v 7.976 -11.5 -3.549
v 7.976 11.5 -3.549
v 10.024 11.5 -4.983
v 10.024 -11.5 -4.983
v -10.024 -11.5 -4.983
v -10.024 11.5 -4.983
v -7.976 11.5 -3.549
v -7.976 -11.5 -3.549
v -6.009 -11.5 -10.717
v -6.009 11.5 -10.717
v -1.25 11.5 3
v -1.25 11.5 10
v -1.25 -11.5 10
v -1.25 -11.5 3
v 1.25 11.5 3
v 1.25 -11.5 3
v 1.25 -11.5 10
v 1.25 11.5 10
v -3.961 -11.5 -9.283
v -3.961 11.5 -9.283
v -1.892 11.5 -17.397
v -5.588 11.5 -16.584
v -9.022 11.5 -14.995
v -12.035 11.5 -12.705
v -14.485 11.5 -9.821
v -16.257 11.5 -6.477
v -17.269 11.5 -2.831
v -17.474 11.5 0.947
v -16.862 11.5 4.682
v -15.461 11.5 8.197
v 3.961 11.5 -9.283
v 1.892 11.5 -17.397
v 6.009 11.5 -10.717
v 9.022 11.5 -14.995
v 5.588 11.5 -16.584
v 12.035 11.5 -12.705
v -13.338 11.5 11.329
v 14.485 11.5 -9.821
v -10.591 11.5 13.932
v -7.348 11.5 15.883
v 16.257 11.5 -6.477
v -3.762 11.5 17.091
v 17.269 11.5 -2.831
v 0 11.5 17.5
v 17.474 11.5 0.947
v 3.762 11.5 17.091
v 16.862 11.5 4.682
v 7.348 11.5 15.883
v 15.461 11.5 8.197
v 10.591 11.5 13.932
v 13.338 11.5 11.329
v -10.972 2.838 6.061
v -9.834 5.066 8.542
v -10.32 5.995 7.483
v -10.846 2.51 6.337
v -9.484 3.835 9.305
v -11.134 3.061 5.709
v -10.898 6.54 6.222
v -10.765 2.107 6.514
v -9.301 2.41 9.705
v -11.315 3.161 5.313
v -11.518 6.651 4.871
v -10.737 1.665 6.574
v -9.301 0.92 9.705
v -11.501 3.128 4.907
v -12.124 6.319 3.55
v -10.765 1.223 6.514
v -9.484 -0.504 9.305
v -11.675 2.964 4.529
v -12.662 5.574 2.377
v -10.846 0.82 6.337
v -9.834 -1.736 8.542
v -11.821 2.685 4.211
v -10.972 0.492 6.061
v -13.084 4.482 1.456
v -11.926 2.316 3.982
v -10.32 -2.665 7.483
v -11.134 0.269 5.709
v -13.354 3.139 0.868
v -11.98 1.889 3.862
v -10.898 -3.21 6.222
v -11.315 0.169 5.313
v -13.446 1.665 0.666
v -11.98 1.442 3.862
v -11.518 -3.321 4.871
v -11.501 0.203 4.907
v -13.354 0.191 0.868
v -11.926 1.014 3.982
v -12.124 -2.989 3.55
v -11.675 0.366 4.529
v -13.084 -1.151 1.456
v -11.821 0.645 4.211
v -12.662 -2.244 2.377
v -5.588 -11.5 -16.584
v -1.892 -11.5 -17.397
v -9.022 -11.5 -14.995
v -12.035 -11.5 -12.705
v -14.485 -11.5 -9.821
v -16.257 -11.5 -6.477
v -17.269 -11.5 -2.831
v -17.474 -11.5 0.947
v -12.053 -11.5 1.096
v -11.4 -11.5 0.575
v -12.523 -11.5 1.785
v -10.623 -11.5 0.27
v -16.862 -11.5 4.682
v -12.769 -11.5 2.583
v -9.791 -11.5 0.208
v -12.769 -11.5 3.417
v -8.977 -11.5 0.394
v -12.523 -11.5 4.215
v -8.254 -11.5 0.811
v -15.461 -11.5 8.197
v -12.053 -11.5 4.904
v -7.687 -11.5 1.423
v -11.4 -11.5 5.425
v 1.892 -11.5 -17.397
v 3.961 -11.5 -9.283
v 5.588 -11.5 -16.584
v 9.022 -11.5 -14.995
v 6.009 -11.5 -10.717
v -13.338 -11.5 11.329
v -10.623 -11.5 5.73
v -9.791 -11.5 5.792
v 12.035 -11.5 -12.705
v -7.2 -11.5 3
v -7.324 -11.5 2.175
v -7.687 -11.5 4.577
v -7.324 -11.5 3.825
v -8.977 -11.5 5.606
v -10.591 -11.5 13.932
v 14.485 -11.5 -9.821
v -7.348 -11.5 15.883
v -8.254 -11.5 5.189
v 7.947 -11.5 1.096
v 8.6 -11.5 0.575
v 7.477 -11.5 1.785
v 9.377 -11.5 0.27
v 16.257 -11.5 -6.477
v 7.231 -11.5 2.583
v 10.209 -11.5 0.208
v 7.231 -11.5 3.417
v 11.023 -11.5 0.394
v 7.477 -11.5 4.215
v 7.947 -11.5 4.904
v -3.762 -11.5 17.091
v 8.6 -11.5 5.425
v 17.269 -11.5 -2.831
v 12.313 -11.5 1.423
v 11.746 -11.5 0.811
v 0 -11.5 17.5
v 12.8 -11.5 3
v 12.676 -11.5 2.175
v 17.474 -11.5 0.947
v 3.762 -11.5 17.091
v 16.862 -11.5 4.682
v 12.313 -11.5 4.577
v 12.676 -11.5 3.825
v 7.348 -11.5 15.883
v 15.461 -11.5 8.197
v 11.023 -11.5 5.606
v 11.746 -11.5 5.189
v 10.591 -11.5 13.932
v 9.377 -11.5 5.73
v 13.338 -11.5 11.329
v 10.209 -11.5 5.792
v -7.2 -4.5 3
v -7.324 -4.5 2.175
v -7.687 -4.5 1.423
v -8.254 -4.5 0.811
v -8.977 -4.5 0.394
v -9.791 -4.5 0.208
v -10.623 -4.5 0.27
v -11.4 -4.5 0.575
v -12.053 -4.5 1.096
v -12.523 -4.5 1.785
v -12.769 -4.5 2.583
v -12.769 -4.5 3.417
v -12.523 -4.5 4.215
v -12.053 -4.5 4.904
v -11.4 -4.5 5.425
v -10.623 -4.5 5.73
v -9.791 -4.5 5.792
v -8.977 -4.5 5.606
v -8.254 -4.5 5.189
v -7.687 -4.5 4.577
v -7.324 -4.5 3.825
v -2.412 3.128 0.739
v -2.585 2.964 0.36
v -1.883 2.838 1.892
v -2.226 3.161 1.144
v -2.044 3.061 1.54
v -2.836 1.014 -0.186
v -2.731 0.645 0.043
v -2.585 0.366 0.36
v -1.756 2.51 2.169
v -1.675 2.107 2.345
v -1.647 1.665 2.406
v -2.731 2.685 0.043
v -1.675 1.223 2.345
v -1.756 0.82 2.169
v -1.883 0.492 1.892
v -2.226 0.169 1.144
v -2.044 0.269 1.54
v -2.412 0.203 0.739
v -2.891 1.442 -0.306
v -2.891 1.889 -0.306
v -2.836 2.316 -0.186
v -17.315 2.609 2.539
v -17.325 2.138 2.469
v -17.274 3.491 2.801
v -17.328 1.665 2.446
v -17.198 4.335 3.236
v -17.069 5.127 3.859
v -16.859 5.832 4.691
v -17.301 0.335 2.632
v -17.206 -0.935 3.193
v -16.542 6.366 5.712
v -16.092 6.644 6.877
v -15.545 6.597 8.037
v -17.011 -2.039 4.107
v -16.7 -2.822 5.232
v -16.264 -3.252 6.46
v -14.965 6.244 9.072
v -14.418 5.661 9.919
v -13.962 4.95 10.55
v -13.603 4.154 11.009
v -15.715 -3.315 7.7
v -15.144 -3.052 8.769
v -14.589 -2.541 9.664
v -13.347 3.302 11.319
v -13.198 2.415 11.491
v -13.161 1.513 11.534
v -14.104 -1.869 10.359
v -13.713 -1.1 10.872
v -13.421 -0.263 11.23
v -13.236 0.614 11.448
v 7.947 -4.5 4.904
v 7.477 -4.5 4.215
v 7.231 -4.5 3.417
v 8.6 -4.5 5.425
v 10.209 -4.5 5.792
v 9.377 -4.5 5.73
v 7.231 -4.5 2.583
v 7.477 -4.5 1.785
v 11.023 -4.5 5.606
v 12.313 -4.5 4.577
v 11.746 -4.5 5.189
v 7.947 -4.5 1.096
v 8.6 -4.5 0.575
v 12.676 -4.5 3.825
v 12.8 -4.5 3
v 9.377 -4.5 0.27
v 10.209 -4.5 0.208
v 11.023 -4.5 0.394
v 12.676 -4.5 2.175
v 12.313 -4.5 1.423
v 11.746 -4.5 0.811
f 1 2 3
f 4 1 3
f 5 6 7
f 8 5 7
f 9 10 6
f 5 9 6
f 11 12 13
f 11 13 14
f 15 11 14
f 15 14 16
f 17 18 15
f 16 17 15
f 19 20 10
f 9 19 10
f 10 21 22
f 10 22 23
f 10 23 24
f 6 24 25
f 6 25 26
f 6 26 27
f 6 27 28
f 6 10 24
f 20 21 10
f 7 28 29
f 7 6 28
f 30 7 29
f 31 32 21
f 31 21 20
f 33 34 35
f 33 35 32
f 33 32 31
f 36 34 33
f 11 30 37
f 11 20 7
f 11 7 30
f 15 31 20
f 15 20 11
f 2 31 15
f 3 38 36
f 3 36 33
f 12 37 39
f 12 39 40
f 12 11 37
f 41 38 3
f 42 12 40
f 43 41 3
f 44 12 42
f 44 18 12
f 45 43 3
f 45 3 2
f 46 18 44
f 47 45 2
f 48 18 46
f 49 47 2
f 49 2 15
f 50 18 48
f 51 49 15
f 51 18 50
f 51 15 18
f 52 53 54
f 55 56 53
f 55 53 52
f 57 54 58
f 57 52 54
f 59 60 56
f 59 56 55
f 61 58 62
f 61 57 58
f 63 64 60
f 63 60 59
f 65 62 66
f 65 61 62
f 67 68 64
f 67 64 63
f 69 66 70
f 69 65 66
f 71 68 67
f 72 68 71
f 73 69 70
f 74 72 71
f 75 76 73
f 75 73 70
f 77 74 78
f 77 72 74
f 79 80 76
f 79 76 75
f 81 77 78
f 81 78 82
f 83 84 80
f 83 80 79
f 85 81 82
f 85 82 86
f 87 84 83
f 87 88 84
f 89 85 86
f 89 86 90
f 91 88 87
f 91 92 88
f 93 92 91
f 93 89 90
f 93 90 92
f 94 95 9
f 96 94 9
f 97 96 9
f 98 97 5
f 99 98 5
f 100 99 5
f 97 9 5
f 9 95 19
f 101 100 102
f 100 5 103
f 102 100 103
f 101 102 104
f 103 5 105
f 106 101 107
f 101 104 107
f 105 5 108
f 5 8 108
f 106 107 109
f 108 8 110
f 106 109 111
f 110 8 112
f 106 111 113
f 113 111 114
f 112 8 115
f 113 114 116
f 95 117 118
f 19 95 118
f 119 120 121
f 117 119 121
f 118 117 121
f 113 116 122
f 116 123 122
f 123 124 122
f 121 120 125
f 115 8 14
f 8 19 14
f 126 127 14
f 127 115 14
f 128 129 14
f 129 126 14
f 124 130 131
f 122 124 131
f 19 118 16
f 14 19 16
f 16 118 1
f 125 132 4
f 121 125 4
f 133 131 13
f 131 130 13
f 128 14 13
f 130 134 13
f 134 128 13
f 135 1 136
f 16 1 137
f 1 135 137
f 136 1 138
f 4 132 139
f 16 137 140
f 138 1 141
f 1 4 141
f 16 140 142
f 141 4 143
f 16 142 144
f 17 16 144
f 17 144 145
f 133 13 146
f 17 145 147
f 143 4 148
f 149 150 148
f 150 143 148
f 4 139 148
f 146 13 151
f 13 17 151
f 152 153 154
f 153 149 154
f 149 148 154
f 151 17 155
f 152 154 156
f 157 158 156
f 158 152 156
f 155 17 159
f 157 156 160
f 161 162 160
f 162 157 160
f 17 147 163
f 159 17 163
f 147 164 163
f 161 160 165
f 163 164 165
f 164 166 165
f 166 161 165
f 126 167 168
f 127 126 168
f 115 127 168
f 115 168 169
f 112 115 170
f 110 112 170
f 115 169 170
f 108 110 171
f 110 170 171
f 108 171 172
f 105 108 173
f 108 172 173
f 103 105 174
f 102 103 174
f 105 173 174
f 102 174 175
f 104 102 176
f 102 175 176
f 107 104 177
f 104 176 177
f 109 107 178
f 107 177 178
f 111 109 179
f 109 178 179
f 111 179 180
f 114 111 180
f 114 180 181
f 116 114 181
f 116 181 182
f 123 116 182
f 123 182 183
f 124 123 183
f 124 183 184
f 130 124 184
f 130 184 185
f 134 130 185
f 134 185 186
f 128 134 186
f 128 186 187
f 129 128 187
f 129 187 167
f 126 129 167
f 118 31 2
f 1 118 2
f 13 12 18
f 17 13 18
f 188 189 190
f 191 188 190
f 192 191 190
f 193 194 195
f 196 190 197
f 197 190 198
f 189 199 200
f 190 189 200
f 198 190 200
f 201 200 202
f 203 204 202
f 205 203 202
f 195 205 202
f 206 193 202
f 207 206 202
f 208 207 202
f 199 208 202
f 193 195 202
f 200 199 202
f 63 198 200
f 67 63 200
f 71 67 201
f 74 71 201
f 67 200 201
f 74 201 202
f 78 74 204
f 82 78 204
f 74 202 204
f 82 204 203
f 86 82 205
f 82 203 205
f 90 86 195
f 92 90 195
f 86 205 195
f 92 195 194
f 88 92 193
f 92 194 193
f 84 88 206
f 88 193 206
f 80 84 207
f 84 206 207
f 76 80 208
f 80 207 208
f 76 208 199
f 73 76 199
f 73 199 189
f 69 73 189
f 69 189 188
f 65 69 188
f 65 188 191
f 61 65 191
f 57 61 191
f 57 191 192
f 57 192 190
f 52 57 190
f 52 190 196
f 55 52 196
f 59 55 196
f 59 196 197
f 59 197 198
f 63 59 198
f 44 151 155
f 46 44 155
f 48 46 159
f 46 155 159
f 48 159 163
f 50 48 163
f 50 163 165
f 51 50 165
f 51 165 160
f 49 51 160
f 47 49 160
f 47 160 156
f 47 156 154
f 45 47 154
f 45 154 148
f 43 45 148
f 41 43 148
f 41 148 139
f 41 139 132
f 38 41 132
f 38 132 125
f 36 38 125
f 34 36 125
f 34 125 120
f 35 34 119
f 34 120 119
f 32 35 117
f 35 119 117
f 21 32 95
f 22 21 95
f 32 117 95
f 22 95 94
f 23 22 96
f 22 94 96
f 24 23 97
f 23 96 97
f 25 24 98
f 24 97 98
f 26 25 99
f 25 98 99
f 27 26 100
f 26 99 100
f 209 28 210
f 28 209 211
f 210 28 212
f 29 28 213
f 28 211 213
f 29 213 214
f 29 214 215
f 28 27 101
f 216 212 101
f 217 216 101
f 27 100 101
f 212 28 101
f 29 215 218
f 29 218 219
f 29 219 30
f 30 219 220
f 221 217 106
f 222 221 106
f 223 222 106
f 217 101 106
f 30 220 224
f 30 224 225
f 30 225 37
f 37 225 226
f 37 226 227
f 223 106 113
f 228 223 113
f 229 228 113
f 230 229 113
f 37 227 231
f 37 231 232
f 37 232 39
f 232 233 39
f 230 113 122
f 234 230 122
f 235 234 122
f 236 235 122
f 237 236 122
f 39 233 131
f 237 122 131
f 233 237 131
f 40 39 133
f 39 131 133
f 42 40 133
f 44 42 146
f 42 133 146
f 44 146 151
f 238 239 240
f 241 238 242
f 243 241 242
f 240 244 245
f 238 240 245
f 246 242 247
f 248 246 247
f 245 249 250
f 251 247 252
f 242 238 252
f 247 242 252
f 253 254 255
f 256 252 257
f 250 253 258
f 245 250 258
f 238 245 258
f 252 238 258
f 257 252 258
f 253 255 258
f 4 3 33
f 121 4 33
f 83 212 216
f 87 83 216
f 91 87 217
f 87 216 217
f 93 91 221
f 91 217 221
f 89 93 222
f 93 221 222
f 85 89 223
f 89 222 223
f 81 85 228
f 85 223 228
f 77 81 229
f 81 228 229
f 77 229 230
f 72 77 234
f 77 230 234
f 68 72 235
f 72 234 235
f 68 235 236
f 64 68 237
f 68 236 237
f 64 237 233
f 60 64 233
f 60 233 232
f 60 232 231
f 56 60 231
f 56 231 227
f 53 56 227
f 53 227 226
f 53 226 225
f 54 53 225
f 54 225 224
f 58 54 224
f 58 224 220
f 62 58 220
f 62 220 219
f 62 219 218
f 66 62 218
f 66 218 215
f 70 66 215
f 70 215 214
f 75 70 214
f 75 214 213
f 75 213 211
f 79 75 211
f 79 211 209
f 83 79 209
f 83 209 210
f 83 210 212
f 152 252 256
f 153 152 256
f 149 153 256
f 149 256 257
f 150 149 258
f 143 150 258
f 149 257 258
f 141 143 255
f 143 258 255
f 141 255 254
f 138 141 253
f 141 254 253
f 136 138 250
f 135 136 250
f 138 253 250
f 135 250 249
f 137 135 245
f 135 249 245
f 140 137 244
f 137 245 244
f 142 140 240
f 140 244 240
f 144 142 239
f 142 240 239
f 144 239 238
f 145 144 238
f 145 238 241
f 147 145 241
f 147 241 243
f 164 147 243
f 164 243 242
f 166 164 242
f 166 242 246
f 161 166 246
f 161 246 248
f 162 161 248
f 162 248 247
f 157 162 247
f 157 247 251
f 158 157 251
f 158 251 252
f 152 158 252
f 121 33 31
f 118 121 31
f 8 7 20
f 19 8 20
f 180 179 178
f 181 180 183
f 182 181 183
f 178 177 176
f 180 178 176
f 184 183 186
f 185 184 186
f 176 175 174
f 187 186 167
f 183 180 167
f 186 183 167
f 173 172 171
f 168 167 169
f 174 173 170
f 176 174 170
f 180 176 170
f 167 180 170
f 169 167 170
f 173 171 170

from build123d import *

# Parameters (mm, degrees)
SALIENTE_EXTRUIR1_DEPTH      = 11.5
SALIENTE_EXTRUIR1_DEPTH_BACK = 11.5
CROQUIS1_R                   = 17.5
CROQUIS2_W                   = 2.5
CROQUIS2_H                   = 7
CORTAR_EXTRUIR_L_MINA1_DEPTH = 34.786091813
TALADRO2_D                   = 5.6
TALADRO2_DEPTH               = 7
TALADRO3_D                   = 3
TALADRO3_DEPTH               = 15
TALADRO3_CBORE_D             = 10
TALADRO3_CBORE_DEPTH         = 5


with BuildPart() as part:
    # Croquis1 → Saliente-Extruir1 (new, two sides: drawn at the far end of the back side and taken through both)
    with BuildSketch(Plane(origin=(0, 0, 0), x_dir=(1, 0, 0), z_dir=(0, 1, 0)).offset(-SALIENTE_EXTRUIR1_DEPTH_BACK)):
        Circle(CROQUIS1_R)
    extrude(amount=SALIENTE_EXTRUIR1_DEPTH + SALIENTE_EXTRUIR1_DEPTH_BACK)

    # Croquis2 → Cortar-Extruir-Lámina1 (cut, through all)
    with BuildSketch(Plane(origin=(0, 11.5, 0), x_dir=(1, 0, 0), z_dir=(0, 1, 0))):
        with Locations((0, -6.5)):
            Rectangle(CROQUIS2_W, CROQUIS2_H)
        Polygon((-7.976059945, 3.548965145), (-3.96102489, 9.283029455), (-6.008905001, 10.716970545), (-10.023940055, 4.982906235), align=None)
        Polygon((3.96102489, 9.283029455), (7.976059945, 3.548965145), (10.023940055, 4.982906235), (6.008905001, 10.716970545), align=None)
    extrude(amount=-CORTAR_EXTRUIR_L_MINA1_DEPTH, mode=Mode.SUBTRACT)

    # Taladro2
    with Locations(Plane(origin=(0, -11.5, 0), x_dir=(-1, 0, 0), z_dir=(0, -1, 0))):
        with Locations((-10, -3), (10, -3)):
            Hole(TALADRO2_D / 2, depth=TALADRO2_DEPTH)

    # Taladro3
    with Locations(Plane(origin=(-15.907017578, 1.665123618, 7.294984015), x_dir=(-0.416856229443, 0, -0.908972433011), z_dir=(-0.908972433011, 0, 0.416856229443))):
        with Locations((0, 0)):
            CounterBoreHole(TALADRO3_D / 2, TALADRO3_CBORE_D / 2, TALADRO3_CBORE_DEPTH, depth=TALADRO3_DEPTH)


solid = part.part
